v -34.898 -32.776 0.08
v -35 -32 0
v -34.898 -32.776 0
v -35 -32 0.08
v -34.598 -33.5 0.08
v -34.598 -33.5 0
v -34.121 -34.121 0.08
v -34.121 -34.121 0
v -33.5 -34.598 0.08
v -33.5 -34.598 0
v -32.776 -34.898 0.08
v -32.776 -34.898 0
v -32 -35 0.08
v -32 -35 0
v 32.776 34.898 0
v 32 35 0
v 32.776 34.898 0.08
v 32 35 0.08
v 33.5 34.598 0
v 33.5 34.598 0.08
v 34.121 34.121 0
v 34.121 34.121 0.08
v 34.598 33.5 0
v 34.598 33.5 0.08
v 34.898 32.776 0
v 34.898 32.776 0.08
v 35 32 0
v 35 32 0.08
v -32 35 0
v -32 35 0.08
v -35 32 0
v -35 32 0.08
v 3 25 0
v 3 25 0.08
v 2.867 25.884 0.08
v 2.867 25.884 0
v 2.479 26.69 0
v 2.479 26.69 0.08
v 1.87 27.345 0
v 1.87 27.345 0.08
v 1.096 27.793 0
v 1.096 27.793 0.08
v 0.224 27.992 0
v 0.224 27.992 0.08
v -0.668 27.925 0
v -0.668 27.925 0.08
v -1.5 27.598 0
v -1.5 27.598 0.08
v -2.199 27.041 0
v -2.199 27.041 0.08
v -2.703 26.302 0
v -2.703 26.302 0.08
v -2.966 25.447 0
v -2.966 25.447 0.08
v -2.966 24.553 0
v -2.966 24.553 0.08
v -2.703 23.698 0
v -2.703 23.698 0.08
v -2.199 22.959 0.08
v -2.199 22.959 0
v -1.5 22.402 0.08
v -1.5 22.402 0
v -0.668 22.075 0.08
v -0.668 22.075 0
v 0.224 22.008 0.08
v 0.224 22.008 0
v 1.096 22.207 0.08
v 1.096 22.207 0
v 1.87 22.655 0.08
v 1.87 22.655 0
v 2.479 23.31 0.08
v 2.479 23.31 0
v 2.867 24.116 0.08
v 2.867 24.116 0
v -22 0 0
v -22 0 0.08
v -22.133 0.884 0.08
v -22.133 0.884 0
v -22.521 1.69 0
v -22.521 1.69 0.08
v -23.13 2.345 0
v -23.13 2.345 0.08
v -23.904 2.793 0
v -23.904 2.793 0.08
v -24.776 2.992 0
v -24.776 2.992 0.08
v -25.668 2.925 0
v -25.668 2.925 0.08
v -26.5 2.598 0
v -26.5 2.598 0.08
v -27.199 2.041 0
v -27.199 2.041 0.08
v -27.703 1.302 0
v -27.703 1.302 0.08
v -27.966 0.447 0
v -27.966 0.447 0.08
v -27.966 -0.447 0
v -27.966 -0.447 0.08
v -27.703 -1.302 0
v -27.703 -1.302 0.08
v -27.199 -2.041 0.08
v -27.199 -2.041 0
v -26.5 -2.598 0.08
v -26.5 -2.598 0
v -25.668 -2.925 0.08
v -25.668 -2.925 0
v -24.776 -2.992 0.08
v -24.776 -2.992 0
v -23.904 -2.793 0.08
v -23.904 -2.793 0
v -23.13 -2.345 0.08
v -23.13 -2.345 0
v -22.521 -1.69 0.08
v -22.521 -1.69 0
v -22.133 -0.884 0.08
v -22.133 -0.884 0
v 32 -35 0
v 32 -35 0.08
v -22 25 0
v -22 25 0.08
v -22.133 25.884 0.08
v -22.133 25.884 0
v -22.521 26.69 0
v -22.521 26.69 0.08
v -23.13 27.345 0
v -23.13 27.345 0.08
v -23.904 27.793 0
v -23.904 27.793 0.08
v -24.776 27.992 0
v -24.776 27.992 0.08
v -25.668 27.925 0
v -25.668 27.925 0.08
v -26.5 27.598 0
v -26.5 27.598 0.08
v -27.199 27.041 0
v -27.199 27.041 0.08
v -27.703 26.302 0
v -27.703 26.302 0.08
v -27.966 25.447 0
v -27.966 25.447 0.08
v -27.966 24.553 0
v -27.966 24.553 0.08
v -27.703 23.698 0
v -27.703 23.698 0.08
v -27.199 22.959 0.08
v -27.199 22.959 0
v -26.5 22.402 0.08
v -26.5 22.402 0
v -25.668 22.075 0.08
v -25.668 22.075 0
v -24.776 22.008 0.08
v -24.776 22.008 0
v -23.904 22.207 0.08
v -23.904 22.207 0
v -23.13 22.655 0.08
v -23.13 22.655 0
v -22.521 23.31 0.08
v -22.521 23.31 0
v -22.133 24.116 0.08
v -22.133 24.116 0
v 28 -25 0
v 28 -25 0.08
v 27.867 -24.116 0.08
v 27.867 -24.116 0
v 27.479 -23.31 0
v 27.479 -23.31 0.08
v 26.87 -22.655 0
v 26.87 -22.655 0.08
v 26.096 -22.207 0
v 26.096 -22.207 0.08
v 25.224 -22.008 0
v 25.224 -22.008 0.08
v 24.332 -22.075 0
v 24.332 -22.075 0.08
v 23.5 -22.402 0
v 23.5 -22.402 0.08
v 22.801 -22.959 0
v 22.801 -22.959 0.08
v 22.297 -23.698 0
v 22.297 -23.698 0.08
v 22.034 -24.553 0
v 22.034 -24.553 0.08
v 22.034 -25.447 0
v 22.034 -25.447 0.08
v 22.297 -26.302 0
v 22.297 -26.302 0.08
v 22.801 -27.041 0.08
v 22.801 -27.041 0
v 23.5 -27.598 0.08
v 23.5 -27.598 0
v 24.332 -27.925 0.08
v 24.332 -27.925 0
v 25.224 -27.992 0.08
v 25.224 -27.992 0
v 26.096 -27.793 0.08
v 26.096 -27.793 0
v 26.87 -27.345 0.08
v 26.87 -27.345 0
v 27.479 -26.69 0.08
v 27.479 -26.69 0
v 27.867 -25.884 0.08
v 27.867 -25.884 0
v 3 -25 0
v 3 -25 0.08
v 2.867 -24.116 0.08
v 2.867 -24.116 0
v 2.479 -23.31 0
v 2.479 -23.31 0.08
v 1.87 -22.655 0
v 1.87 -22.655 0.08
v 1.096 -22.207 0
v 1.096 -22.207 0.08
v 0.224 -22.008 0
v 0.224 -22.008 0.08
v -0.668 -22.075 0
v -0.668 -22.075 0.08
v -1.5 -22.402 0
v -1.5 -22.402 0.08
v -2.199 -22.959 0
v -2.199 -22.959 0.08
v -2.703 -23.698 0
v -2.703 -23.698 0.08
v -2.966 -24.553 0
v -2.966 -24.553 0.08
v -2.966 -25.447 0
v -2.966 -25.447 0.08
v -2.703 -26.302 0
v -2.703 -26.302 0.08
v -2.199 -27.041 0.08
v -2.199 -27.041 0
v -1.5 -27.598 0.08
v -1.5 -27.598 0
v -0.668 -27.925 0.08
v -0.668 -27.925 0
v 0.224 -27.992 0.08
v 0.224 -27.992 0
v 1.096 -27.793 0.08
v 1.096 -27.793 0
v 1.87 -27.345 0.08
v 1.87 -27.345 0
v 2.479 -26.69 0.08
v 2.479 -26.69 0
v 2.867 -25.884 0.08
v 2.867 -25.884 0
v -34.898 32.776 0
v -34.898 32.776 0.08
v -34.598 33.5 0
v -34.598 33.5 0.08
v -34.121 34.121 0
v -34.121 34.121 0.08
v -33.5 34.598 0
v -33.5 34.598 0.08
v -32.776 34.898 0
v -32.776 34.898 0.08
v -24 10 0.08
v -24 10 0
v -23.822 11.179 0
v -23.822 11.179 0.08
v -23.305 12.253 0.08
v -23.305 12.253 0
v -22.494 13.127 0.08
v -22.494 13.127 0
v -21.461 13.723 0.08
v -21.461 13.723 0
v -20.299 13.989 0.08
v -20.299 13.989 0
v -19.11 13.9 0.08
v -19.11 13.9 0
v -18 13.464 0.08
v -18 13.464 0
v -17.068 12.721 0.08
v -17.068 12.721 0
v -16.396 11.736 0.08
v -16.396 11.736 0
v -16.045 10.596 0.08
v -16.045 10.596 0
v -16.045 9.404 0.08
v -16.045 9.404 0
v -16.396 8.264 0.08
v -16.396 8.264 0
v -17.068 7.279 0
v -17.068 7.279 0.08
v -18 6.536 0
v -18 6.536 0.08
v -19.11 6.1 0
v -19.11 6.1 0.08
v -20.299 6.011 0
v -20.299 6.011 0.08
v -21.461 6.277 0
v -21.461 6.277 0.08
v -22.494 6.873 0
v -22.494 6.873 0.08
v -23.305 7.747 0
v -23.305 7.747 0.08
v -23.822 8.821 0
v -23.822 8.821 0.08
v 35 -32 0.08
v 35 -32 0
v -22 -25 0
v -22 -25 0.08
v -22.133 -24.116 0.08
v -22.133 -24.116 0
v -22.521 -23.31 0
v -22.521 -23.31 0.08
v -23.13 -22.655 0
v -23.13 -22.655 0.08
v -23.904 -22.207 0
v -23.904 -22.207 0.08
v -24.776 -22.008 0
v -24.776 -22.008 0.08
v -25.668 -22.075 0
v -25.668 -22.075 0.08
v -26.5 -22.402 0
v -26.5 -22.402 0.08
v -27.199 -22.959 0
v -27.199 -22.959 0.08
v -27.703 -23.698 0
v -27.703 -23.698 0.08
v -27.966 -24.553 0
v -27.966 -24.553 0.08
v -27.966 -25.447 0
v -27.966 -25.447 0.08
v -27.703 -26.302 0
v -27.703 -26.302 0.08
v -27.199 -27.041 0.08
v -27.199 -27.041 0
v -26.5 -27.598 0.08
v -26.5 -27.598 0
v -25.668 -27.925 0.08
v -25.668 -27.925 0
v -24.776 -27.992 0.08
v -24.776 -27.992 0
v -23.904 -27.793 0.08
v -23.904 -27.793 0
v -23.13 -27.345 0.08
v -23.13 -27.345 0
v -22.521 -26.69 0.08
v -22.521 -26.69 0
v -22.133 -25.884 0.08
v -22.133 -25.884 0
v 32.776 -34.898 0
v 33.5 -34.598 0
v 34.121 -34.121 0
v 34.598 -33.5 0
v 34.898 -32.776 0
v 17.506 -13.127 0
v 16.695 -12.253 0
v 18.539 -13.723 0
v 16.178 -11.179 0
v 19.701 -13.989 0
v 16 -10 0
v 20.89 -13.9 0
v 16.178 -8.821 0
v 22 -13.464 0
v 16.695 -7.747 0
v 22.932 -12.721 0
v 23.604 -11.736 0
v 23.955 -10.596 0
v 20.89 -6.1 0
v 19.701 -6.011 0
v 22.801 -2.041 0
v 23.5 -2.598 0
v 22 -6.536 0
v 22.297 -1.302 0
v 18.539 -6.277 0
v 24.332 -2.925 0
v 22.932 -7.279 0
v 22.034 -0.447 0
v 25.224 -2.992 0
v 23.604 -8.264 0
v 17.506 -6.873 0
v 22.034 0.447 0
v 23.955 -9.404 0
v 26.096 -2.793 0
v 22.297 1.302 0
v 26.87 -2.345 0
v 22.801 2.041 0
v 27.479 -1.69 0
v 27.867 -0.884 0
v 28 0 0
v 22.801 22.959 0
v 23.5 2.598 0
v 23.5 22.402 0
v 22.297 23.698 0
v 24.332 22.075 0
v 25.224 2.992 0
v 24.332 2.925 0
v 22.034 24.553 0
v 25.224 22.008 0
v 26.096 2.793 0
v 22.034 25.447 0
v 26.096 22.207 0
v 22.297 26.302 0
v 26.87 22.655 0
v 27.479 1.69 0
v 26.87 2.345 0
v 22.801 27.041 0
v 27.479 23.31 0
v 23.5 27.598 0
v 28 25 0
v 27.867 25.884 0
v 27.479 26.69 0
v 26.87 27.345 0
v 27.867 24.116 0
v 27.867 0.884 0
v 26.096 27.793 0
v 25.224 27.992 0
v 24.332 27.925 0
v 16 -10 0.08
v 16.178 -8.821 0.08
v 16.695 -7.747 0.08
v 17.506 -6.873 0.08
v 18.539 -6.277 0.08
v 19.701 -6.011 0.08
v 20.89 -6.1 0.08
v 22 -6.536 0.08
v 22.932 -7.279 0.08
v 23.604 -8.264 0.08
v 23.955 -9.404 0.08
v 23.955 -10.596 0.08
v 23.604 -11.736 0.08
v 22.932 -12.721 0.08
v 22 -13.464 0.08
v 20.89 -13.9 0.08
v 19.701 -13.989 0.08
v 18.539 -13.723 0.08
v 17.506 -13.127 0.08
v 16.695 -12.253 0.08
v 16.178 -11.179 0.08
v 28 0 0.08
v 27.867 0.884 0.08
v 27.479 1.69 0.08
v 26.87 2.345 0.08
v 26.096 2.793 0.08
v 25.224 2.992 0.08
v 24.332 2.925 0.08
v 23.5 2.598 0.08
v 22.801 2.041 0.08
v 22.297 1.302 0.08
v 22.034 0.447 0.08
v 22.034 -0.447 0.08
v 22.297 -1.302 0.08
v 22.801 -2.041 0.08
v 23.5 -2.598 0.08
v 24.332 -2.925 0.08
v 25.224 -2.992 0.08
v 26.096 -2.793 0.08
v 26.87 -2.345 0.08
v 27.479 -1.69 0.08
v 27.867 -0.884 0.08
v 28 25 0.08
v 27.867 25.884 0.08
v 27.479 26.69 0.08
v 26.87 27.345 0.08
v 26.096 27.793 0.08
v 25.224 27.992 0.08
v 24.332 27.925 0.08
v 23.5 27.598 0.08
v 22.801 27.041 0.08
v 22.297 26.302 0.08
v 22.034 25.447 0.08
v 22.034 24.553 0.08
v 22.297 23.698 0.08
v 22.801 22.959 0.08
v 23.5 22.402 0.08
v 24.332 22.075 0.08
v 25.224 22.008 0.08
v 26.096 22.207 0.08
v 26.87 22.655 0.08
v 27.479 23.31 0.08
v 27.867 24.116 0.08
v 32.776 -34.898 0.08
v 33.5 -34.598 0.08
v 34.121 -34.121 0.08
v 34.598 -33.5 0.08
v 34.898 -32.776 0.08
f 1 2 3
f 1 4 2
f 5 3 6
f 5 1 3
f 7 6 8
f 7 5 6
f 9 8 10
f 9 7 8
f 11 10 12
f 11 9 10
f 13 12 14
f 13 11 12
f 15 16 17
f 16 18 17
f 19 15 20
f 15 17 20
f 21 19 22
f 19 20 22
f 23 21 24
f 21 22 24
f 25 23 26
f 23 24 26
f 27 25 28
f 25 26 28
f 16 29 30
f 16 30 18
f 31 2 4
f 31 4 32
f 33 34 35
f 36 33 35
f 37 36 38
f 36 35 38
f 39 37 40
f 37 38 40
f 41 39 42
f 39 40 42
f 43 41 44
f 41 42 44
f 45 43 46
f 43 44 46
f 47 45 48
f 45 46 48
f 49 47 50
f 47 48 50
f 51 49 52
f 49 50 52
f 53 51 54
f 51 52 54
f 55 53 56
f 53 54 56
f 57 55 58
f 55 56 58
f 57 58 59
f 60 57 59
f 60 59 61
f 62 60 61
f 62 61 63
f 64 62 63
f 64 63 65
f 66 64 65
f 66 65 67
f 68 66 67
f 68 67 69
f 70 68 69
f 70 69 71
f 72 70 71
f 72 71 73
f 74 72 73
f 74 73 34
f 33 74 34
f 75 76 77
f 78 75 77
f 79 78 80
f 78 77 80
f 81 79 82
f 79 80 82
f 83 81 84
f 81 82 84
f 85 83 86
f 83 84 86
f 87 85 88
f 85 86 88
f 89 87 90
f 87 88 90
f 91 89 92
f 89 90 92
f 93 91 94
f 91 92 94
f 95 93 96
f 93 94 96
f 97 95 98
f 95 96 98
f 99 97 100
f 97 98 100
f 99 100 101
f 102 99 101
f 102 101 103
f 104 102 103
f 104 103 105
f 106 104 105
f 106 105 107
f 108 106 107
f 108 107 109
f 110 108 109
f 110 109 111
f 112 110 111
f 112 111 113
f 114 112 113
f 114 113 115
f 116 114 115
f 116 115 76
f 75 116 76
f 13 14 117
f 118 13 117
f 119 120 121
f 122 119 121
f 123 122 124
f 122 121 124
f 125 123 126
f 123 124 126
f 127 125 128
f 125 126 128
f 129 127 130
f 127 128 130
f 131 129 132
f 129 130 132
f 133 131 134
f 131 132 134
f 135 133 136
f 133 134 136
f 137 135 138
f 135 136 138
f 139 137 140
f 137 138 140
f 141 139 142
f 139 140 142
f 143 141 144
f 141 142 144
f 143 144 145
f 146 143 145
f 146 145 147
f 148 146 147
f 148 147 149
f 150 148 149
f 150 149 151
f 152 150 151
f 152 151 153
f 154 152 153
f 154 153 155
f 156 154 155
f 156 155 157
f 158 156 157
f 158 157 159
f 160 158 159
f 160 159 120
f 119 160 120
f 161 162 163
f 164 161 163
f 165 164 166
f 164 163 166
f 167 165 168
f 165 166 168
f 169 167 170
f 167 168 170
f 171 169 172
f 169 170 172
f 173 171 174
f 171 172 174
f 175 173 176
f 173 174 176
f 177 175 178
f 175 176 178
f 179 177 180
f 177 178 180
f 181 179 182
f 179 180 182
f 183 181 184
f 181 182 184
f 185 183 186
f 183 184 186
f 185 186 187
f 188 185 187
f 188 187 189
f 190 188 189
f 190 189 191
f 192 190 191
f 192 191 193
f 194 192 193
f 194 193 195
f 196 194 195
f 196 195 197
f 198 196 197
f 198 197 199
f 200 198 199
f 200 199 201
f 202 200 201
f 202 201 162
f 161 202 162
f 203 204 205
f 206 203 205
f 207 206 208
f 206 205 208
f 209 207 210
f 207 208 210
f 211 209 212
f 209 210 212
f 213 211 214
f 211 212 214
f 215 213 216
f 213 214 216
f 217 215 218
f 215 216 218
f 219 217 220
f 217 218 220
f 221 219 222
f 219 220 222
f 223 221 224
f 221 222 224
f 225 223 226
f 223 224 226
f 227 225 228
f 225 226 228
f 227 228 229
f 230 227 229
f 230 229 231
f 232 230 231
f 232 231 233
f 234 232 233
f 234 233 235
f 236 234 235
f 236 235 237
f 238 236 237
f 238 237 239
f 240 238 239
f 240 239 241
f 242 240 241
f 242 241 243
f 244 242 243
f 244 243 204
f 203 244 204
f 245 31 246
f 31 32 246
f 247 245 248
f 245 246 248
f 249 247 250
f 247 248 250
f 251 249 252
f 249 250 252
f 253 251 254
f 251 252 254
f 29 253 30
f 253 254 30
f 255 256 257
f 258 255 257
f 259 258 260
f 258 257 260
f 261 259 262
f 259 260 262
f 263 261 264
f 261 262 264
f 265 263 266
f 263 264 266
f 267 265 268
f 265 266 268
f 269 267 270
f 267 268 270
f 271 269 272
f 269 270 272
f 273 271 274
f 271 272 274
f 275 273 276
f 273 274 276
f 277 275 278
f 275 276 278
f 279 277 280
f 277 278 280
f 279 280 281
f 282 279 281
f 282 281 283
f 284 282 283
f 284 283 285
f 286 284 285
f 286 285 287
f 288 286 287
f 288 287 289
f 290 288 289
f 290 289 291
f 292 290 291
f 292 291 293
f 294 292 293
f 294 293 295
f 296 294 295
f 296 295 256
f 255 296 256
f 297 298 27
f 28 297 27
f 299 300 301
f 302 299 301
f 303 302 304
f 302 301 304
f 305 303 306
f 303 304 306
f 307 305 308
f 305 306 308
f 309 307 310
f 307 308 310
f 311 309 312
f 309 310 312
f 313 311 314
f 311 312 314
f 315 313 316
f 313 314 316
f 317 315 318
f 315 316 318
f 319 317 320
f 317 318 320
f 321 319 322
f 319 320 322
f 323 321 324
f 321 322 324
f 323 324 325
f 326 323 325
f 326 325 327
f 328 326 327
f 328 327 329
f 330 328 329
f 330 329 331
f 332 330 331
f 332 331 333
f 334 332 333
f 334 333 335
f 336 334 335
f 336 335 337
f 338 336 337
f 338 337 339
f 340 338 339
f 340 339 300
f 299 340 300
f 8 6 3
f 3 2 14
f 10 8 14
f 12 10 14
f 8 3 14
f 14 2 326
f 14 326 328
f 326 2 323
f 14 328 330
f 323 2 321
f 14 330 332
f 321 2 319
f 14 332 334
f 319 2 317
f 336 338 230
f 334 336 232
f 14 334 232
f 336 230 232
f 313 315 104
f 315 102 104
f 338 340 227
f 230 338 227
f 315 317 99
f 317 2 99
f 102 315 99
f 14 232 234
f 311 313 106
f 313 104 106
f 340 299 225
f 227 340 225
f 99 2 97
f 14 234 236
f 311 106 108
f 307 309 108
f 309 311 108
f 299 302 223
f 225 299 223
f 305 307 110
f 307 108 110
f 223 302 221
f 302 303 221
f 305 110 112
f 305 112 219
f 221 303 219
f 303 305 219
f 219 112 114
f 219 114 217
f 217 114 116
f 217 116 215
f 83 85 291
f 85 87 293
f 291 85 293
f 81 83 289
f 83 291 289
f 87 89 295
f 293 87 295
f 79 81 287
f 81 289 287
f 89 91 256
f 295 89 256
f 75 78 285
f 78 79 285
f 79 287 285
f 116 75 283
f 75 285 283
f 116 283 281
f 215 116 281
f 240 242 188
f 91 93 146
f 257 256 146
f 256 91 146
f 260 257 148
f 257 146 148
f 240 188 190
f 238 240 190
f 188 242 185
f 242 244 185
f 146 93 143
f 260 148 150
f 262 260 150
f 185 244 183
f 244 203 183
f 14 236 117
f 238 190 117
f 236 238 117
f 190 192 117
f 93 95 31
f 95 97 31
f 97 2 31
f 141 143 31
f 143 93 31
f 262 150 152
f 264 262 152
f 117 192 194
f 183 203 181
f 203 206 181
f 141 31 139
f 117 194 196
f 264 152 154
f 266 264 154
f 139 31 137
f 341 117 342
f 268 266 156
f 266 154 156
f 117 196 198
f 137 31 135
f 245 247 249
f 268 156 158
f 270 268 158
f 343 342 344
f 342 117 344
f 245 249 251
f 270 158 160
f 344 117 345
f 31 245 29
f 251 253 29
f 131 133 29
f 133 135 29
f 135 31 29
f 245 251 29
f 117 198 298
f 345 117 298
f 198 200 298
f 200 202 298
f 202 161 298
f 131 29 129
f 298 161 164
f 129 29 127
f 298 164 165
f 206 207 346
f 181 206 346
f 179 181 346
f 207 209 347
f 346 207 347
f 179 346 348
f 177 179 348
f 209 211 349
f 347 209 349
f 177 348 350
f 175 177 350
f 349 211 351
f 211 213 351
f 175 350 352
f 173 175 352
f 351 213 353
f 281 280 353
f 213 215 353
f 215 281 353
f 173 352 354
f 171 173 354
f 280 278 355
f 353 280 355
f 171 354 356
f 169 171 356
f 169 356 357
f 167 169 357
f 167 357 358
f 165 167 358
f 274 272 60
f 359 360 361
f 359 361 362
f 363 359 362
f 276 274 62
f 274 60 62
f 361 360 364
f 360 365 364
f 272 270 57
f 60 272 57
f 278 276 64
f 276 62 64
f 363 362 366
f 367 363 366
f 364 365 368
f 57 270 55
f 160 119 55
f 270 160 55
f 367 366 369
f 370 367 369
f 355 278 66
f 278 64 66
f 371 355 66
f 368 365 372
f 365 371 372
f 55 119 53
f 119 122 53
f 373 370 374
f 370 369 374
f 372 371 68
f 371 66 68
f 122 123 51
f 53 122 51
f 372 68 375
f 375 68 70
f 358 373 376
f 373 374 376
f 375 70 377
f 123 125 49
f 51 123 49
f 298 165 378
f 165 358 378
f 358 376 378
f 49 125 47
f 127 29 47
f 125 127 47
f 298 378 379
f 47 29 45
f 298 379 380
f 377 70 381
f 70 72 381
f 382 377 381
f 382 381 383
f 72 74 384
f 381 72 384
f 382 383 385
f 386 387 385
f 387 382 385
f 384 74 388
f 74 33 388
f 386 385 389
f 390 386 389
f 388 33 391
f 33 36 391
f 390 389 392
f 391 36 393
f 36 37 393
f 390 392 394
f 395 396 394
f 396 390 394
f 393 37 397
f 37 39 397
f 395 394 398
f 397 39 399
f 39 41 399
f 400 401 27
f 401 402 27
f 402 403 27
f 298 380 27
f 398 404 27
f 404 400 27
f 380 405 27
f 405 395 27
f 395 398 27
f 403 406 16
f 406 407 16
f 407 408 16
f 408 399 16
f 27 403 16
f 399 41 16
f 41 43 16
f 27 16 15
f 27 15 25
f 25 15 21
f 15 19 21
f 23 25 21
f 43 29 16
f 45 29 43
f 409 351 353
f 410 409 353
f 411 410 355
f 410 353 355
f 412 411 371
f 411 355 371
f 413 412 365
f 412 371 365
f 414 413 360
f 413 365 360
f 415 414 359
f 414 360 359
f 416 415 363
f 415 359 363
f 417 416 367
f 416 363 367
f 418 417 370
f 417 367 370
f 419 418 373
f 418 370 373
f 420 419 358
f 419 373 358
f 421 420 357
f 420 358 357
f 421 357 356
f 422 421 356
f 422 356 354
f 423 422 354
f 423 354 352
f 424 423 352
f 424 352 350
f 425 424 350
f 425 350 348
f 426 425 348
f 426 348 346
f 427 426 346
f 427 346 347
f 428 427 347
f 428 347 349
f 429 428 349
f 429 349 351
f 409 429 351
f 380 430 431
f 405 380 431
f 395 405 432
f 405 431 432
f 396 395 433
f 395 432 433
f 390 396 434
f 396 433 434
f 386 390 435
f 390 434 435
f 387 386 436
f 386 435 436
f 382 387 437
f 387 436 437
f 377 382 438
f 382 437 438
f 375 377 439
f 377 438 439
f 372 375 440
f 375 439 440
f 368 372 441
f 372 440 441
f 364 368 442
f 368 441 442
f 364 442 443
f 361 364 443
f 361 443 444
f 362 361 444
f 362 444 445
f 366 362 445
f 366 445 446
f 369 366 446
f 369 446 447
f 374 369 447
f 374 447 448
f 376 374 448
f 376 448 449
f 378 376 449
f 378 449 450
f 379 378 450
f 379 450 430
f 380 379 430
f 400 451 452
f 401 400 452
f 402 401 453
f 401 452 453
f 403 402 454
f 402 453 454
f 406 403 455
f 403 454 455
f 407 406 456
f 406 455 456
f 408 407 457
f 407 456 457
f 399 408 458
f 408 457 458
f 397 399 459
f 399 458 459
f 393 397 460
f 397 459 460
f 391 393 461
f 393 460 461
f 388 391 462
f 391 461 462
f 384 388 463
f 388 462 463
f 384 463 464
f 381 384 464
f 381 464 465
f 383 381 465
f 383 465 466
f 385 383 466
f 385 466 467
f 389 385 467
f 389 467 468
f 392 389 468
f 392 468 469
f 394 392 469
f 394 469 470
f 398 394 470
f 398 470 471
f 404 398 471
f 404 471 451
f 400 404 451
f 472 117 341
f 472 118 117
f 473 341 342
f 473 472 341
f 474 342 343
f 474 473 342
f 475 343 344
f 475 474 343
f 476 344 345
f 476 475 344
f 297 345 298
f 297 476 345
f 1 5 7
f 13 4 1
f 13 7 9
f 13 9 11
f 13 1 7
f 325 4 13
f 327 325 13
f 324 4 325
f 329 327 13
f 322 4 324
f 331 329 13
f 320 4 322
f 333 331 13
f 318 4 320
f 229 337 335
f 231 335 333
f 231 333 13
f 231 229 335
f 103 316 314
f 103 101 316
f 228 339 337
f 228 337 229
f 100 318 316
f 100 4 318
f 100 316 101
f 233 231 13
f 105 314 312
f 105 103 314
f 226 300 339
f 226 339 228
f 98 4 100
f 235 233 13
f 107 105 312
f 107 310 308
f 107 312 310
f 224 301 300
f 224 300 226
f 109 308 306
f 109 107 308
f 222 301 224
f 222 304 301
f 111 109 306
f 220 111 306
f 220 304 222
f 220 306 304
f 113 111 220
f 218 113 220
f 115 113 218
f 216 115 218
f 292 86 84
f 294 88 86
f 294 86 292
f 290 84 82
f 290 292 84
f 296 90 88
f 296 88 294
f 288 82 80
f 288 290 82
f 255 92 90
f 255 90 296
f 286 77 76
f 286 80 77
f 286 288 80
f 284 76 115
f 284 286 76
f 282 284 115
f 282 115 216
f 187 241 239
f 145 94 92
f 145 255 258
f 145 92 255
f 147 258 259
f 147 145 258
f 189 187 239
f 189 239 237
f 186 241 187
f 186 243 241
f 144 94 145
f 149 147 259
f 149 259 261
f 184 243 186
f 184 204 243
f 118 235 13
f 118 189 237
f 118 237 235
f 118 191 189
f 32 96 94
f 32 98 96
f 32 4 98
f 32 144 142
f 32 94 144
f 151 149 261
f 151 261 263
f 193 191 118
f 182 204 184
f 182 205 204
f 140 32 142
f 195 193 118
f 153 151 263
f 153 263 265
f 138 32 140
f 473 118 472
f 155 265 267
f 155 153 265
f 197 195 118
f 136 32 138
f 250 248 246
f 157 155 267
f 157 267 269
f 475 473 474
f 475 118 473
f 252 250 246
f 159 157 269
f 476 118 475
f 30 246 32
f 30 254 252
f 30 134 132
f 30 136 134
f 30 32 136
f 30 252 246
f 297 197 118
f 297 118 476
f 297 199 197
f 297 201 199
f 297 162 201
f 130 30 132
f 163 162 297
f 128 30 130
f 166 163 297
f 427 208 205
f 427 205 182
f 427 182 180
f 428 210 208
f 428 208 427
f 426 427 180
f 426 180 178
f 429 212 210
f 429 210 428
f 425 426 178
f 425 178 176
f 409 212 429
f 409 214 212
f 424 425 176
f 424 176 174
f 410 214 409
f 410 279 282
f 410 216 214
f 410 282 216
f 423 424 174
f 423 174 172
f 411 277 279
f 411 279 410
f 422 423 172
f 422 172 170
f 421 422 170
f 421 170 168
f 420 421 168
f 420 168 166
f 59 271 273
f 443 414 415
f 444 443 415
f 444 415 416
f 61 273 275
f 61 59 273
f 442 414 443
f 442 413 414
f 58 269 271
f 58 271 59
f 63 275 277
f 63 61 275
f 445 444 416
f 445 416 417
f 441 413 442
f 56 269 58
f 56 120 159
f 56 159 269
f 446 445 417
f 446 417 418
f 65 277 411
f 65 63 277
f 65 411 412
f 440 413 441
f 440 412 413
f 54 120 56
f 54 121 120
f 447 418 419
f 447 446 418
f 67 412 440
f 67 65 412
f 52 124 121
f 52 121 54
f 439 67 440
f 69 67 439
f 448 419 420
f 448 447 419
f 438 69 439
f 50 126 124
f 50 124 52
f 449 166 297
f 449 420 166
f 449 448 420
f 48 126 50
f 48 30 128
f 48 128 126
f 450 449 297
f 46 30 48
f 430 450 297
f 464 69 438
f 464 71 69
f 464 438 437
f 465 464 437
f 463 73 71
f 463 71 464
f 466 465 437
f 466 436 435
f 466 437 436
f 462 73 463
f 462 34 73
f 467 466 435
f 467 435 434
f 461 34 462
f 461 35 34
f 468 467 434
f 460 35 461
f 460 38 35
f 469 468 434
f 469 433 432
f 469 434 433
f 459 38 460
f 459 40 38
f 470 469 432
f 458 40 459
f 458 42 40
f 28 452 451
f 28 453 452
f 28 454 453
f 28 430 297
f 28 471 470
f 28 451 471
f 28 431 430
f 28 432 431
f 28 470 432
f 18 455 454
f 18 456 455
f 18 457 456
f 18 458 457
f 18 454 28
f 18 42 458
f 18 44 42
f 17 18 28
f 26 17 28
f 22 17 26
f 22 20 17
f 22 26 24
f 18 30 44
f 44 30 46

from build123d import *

# Parameters (mm, degrees)
SKETCH1_W           = 70
SKETCH1_H           = 70
BOSS_EXTRUDE1_DEPTH = 0.08
SKETCH2_R           = 3
CUT_EXTRUDE1_DEPTH  = 10
FILLET1_R           = 3
SKETCH3_R           = 4
CUT_EXTRUDE2_DEPTH  = 10


with BuildPart() as part:
    # Sketch1 → Boss-Extrude1 (new body)
    with BuildSketch(Plane.XY):
        Rectangle(SKETCH1_W, SKETCH1_H)
    extrude(amount=BOSS_EXTRUDE1_DEPTH)

    # Sketch2 → Cut-Extrude1 (cut)
    with BuildSketch(Plane.XY.offset(0.08)):
        with Locations((0, 25)):
            Circle(SKETCH2_R)
        with Locations((25, 25)):
            Circle(SKETCH2_R)
        with Locations((25, 0)):
            Circle(SKETCH2_R)
        with Locations((-25, 0)):
            Circle(SKETCH2_R)
        with Locations((-25, 25)):
            Circle(SKETCH2_R)
        with Locations((-25, -25)):
            Circle(SKETCH2_R)
        with Locations((0, -25)):
            Circle(SKETCH2_R)
        with Locations((25, -25)):
            Circle(SKETCH2_R)
    extrude(amount=-CUT_EXTRUDE1_DEPTH, mode=Mode.SUBTRACT)

    # Fillet1
    fillet1_edges = [part.edges().sort_by_distance(p)[0] for p in [
        (35, -35, 0.04),
        (-35, -35, 0.04),
        (-35, 35, 0.04),
        (35, 35, 0.04),
    ]]
    fillet(fillet1_edges, radius=FILLET1_R)

    # Sketch3 → Cut-Extrude2 (cut)
    with BuildSketch(Plane(origin=(0, 0, 0), x_dir=(-1, 0, 0), z_dir=(0, 0, -1))):
        with Locations((20, 10)):
            Circle(SKETCH3_R)
        with Locations((-20, -10)):
            Circle(SKETCH3_R)
    extrude(amount=-CUT_EXTRUDE2_DEPTH, mode=Mode.SUBTRACT)


solid = part.part
